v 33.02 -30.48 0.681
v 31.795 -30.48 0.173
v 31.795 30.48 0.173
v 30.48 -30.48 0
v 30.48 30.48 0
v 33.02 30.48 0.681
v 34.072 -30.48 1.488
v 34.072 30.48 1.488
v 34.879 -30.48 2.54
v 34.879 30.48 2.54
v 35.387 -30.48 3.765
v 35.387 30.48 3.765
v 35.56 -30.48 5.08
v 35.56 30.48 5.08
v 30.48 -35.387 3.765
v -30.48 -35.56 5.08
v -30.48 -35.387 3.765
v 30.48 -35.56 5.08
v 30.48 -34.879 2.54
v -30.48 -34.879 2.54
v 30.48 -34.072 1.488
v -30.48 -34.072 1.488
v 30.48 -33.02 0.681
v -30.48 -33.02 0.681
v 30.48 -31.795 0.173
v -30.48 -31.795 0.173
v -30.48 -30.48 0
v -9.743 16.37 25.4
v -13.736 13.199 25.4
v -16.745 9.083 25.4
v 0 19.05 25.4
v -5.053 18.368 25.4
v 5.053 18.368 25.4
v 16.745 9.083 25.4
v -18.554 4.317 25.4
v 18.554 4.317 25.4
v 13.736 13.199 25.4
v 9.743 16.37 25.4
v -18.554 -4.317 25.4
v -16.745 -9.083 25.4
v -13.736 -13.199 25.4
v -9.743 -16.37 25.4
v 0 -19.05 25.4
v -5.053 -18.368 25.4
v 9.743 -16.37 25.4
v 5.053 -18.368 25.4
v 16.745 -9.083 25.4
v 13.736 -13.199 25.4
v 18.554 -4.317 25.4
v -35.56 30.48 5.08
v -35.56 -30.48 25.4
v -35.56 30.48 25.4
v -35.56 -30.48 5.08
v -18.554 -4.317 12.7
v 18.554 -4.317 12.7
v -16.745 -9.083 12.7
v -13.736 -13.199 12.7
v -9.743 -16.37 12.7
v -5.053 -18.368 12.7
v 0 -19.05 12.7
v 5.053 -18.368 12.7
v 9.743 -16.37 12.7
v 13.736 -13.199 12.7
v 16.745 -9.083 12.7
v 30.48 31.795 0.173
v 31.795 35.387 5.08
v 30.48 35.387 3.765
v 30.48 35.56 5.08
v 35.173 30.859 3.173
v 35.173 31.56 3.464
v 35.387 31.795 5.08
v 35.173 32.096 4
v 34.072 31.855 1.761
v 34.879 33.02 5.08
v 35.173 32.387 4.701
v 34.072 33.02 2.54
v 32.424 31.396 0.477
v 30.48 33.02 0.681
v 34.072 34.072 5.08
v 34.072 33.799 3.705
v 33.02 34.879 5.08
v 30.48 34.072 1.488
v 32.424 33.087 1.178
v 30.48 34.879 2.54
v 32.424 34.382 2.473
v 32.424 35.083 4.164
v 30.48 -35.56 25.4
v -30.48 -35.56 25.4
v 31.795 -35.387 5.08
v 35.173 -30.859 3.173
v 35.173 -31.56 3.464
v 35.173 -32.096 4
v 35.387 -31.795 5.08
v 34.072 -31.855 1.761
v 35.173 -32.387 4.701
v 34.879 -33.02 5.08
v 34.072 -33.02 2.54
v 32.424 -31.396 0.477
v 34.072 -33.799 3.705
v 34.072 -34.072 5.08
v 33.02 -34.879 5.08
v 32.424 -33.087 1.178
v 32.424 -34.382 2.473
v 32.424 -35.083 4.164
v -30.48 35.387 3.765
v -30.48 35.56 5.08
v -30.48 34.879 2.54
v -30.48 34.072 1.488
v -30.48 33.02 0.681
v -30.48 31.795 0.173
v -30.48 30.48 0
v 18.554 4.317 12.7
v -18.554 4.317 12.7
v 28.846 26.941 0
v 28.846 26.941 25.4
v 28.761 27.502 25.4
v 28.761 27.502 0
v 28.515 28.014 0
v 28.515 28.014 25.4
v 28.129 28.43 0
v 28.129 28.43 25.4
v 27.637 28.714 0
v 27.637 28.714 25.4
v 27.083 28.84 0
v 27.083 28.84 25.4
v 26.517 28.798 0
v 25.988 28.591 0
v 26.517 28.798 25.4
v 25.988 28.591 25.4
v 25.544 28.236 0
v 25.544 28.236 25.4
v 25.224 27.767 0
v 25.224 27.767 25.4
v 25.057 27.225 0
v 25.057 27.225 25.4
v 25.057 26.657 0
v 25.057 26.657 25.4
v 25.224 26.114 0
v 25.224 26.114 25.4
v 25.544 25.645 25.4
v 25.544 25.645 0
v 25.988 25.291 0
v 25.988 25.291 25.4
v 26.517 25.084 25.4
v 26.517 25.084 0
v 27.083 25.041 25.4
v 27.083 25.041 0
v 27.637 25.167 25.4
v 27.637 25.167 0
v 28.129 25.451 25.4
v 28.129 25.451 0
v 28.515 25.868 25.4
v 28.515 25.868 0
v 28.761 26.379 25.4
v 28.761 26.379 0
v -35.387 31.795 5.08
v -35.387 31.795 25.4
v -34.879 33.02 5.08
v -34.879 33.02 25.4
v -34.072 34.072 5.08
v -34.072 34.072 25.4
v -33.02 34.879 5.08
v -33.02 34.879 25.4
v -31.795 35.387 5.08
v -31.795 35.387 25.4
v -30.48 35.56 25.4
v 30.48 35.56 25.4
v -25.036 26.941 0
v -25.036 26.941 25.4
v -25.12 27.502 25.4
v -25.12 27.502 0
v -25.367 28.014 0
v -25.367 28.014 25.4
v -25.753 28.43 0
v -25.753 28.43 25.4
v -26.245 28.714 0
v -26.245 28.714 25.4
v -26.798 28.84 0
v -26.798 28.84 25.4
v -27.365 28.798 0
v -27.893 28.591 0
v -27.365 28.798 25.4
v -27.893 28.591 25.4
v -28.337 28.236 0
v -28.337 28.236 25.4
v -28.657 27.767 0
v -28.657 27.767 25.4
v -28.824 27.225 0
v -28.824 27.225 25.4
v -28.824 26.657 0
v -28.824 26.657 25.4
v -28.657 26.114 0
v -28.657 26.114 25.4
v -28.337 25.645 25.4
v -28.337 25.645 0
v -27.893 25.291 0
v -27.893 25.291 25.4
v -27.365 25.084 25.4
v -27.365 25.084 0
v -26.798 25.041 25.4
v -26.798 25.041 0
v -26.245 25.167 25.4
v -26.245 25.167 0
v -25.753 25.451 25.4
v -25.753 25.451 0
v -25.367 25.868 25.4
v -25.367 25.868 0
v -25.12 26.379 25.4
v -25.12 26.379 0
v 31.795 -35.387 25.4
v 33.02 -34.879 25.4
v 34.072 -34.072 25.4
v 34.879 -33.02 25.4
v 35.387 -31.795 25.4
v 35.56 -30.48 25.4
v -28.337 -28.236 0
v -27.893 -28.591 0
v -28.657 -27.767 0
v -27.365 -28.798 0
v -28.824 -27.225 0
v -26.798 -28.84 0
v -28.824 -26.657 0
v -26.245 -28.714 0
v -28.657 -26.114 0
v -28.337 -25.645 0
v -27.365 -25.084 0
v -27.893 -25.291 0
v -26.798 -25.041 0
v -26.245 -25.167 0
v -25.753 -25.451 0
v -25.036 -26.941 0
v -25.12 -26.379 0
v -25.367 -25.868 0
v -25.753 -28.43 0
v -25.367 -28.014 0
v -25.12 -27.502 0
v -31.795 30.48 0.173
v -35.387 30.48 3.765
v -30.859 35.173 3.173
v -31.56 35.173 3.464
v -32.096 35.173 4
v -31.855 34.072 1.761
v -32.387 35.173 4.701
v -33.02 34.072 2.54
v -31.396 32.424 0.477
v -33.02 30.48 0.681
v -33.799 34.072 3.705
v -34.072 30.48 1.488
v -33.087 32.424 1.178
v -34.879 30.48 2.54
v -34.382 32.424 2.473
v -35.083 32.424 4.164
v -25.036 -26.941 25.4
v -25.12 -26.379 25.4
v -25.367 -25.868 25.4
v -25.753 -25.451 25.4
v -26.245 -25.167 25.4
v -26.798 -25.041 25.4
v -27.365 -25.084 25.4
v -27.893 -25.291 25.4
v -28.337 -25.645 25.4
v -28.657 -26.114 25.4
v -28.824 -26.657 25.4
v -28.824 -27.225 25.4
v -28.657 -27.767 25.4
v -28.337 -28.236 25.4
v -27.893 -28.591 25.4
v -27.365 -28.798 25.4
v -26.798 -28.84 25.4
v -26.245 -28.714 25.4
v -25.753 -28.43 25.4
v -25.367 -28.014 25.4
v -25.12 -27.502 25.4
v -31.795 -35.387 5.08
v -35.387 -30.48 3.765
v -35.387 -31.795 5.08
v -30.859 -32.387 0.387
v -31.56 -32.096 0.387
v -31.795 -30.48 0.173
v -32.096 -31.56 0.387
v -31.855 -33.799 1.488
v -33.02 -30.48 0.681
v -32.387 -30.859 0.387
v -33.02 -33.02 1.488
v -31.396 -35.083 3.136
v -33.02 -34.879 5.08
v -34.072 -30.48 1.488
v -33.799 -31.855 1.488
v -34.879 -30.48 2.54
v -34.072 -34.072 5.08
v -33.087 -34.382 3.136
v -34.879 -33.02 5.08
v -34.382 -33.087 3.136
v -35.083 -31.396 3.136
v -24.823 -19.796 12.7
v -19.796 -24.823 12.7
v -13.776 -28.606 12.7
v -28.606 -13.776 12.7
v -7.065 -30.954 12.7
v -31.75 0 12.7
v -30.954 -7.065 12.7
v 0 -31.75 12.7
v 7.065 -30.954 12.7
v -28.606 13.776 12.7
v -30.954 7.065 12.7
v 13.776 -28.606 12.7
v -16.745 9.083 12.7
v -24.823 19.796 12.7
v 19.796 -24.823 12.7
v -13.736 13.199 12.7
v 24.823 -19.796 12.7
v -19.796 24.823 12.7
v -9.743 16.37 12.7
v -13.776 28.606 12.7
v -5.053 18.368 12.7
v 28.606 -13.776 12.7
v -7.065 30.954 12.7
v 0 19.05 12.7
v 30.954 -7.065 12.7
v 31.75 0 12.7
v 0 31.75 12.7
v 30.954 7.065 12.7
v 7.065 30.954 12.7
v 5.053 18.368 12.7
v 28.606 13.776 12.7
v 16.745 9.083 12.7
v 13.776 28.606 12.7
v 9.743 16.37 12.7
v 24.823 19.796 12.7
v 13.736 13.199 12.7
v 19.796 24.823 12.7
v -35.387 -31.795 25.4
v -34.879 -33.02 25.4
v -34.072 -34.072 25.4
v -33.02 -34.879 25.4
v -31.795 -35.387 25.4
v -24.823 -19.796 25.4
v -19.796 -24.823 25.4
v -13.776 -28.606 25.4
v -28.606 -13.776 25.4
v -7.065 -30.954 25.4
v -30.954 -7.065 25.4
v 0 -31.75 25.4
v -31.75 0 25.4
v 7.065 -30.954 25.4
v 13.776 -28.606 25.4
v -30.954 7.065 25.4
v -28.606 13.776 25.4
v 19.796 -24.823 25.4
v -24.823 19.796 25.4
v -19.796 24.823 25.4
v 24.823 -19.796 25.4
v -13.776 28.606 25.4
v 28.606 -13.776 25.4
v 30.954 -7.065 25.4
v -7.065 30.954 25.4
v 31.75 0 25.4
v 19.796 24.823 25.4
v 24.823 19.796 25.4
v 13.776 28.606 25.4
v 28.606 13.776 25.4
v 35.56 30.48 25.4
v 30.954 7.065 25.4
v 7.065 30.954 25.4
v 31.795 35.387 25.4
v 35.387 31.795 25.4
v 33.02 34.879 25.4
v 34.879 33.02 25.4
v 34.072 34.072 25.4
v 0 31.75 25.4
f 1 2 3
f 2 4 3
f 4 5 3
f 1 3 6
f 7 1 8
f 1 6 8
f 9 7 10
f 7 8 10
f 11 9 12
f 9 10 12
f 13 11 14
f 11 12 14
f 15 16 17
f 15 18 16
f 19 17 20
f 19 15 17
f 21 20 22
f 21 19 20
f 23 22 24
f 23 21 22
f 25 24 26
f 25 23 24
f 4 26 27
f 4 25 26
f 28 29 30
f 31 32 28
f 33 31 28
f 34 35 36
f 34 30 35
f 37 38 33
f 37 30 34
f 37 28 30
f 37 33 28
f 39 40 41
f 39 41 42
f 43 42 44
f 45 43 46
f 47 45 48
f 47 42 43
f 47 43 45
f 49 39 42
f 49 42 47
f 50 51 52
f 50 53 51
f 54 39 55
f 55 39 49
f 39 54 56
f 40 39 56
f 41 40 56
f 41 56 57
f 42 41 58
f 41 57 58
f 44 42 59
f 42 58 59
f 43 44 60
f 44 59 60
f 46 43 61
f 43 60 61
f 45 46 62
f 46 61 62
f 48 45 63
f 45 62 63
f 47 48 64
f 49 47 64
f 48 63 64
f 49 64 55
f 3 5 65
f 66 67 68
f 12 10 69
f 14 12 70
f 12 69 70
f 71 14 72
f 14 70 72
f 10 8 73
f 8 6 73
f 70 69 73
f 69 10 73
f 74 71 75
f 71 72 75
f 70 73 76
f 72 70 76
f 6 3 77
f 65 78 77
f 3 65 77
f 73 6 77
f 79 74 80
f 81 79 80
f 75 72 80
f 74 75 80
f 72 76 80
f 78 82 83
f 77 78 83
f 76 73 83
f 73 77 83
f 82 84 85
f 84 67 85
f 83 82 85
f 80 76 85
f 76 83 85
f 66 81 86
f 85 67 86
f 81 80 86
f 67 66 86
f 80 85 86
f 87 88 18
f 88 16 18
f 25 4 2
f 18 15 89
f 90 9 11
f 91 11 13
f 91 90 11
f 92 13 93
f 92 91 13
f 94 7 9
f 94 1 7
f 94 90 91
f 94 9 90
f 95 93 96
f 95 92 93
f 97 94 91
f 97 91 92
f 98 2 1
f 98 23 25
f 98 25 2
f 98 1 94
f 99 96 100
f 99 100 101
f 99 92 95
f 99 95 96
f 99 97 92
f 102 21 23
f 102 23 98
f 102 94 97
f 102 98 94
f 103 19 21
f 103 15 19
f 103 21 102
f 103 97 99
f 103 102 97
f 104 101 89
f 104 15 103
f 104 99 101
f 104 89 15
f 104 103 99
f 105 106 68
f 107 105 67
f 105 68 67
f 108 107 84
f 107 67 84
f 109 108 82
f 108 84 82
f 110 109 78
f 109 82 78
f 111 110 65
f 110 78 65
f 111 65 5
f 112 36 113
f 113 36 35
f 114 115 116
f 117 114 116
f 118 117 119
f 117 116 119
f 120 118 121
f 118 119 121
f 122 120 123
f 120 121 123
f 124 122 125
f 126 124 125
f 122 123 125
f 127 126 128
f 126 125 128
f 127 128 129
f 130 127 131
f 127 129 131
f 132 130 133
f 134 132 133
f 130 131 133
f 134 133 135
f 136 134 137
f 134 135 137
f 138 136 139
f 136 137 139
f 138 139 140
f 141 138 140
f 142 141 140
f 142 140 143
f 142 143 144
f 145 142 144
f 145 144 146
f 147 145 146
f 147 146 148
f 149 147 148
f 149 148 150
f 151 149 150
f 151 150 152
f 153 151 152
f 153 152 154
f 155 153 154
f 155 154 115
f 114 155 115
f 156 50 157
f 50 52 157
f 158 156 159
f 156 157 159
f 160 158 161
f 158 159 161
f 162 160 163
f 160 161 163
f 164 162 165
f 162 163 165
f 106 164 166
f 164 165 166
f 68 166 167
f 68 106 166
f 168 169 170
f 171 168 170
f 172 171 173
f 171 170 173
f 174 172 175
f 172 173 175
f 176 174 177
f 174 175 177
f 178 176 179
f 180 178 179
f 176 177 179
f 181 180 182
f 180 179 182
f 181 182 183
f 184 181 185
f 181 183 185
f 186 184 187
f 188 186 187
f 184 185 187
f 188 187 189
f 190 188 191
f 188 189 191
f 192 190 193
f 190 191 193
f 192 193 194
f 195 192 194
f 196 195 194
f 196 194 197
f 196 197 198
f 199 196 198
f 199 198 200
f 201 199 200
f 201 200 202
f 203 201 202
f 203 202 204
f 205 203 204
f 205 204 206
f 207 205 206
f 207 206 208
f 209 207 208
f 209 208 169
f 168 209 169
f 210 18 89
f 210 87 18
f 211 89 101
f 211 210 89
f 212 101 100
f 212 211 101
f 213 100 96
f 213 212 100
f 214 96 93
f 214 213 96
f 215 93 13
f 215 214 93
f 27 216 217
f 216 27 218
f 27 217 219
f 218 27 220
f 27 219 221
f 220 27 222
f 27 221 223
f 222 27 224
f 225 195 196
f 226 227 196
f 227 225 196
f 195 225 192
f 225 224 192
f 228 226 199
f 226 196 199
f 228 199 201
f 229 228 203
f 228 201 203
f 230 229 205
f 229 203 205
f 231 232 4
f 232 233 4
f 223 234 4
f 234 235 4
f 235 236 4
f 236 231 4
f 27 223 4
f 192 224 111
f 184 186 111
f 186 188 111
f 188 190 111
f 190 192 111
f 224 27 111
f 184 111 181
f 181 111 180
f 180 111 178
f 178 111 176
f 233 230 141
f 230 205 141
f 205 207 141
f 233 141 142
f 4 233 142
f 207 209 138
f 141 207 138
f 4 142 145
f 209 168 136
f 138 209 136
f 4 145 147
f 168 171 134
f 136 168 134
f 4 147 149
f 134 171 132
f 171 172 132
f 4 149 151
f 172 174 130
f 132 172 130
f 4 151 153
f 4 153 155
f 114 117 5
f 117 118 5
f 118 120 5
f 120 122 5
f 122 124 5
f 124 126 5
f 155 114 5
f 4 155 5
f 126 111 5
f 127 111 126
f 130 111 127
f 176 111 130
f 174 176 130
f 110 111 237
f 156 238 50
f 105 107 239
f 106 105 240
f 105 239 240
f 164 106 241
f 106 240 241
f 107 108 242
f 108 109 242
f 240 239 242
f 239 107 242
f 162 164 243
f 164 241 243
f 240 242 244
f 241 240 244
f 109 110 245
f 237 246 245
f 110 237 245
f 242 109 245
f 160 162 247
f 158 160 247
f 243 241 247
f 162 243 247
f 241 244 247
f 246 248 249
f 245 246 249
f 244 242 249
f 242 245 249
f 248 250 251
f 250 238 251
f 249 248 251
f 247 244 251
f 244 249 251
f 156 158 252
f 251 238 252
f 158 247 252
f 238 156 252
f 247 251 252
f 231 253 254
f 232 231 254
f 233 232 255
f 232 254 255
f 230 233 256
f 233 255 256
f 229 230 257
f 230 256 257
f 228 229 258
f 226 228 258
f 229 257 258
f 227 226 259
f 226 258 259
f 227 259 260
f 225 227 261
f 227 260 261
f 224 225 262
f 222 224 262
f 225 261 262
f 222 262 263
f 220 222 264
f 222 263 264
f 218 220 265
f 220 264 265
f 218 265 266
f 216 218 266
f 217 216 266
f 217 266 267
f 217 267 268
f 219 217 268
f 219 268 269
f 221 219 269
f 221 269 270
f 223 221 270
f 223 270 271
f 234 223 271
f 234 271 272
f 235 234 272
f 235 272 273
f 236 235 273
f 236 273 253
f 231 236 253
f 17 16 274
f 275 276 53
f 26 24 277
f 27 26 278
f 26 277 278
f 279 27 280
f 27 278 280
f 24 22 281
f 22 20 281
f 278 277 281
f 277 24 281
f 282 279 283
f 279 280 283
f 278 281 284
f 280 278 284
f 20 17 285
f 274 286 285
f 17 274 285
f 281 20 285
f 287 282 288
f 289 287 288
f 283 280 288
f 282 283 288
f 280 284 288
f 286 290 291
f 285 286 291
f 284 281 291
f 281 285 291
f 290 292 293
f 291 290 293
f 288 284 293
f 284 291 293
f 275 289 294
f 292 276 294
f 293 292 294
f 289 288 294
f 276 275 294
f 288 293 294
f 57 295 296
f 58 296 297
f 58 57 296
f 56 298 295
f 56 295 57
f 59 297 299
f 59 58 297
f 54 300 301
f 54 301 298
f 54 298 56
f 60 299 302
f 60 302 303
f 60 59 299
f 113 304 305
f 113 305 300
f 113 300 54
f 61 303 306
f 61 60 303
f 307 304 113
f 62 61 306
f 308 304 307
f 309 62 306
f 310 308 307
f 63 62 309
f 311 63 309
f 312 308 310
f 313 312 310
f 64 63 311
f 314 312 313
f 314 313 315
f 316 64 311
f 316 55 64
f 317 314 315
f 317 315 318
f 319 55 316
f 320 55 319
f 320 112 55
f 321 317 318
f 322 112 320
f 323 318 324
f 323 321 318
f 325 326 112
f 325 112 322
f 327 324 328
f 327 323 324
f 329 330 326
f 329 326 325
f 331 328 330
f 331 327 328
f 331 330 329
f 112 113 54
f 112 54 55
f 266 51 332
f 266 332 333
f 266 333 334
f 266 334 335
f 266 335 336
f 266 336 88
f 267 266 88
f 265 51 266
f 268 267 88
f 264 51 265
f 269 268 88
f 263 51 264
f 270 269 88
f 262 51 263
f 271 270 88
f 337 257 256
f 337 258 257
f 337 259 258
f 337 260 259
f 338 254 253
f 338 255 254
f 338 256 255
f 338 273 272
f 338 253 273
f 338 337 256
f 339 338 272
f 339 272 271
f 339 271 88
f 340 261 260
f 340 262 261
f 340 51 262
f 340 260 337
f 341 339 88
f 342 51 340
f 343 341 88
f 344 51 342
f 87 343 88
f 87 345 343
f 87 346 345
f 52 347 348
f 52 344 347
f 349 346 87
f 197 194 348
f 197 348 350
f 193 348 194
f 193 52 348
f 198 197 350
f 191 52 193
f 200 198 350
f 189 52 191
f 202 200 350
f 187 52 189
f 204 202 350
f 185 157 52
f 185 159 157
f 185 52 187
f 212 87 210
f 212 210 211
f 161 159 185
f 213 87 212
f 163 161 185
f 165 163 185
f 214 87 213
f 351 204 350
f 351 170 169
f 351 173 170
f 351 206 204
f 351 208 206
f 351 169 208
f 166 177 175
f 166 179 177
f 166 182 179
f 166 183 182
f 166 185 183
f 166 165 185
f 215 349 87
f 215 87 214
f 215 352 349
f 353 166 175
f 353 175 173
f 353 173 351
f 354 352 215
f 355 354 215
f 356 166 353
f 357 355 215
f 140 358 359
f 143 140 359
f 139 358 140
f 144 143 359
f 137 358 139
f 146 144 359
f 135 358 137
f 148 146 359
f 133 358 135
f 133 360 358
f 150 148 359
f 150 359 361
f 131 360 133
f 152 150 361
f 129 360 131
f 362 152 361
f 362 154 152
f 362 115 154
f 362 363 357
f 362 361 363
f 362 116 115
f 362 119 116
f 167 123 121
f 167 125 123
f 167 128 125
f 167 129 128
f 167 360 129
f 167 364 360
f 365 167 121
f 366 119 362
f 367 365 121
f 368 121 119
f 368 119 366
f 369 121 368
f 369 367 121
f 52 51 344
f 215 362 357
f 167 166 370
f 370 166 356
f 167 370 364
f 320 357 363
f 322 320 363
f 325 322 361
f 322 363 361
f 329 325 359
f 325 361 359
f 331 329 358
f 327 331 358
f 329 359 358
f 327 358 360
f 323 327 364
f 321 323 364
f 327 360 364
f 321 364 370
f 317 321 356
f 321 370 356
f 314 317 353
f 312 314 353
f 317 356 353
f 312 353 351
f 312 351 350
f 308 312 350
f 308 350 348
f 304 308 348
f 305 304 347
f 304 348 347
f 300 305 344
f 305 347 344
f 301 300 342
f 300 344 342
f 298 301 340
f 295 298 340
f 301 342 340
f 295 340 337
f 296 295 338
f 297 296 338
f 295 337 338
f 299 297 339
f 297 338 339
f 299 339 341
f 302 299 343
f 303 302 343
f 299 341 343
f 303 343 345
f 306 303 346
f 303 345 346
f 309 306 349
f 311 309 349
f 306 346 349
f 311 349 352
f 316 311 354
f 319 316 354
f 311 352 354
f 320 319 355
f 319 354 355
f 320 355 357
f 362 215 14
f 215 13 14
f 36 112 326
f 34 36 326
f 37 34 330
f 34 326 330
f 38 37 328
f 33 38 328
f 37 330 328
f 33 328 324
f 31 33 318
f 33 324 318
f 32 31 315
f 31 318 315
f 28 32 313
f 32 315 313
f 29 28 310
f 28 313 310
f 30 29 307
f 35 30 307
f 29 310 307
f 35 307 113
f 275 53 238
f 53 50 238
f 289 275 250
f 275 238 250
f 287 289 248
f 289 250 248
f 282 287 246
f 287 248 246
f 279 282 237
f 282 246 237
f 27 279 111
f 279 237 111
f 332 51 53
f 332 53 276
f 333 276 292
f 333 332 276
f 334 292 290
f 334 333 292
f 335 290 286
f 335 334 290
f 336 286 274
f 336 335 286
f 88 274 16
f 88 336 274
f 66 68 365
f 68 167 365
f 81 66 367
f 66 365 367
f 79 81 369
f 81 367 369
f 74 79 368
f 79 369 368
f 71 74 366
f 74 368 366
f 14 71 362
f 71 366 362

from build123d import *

# Parameters (mm, degrees)
F0_W     = 71.12
F0_H     = 71.12
F1_DEPTH = 25.4
F2_R     = 31.75
F3_DEPTH = 12.7
F4_R     = 19.05
F5_DEPTH = 12.7
F6_R     = 1.905
F7_DEPTH = 25.401
F9_DEPTH = 12.7
F10_R    = 5.08


with BuildPart() as f1:
    # F0 (on Top) → F1 (new body)
    with BuildSketch(Plane.XY):
        Rectangle(F0_W, F0_H)
    extrude(amount=F1_DEPTH)

    # F2 (on face) → F3 (cut)
    with BuildSketch(Plane.XY.offset(25.4)):
        Circle(F2_R)
    extrude(amount=-F3_DEPTH, mode=Mode.SUBTRACT)

    # F4 (on face) → F5 (join)
    with BuildSketch(Plane.XY.offset(12.7)):
        Circle(F4_R)
    extrude(amount=F5_DEPTH)

    # F6 (on face) → F7 (cut, through all)
    with BuildSketch(Plane.XY.offset(25.4)):
        with Locations((-26.9407683632, -26.9407683632)):
            Circle(F6_R)
        with Locations((-26.9407683632, 26.9407683632)):
            Circle(F6_R)
        with Locations((26.9407683632, 26.9407683632)):
            Circle(F6_R)
    extrude(amount=-F7_DEPTH, mode=Mode.SUBTRACT)

    # F8 (on face) → F9 (cut)
    with BuildSketch(Plane.XY.offset(25.4)):
        with BuildLine():
            ThreePointArc((18.5544223232, -4.3169332), (19.05, 0), (18.5544223232, 4.3169332))
            Line((18.5544223232, 4.3169332), (-18.5544223232, 4.3169332))
            ThreePointArc((-18.5544223232, 4.3169332), (-19.05, 0), (-18.5544223232, -4.3169332))
            Line((-18.5544223232, -4.3169332), (18.5544223232, -4.3169332))
        make_face()
    extrude(amount=-F9_DEPTH, mode=Mode.SUBTRACT)

    # F10
    f10_edges = [f1.edges().sort_by_distance(p)[0] for p in [
        (-35.56, -35.56, 12.7),
        (0, -35.56, 0),
        (-35.56, 0, 0),
        (0, 35.56, 0),
        (35.56, 0, 0),
        (35.56, -35.56, 12.7),
        (35.56, 35.56, 12.7),
        (-35.56, 35.56, 12.7),
    ]]
    fillet(f10_edges, radius=F10_R)


solid = f1.part
